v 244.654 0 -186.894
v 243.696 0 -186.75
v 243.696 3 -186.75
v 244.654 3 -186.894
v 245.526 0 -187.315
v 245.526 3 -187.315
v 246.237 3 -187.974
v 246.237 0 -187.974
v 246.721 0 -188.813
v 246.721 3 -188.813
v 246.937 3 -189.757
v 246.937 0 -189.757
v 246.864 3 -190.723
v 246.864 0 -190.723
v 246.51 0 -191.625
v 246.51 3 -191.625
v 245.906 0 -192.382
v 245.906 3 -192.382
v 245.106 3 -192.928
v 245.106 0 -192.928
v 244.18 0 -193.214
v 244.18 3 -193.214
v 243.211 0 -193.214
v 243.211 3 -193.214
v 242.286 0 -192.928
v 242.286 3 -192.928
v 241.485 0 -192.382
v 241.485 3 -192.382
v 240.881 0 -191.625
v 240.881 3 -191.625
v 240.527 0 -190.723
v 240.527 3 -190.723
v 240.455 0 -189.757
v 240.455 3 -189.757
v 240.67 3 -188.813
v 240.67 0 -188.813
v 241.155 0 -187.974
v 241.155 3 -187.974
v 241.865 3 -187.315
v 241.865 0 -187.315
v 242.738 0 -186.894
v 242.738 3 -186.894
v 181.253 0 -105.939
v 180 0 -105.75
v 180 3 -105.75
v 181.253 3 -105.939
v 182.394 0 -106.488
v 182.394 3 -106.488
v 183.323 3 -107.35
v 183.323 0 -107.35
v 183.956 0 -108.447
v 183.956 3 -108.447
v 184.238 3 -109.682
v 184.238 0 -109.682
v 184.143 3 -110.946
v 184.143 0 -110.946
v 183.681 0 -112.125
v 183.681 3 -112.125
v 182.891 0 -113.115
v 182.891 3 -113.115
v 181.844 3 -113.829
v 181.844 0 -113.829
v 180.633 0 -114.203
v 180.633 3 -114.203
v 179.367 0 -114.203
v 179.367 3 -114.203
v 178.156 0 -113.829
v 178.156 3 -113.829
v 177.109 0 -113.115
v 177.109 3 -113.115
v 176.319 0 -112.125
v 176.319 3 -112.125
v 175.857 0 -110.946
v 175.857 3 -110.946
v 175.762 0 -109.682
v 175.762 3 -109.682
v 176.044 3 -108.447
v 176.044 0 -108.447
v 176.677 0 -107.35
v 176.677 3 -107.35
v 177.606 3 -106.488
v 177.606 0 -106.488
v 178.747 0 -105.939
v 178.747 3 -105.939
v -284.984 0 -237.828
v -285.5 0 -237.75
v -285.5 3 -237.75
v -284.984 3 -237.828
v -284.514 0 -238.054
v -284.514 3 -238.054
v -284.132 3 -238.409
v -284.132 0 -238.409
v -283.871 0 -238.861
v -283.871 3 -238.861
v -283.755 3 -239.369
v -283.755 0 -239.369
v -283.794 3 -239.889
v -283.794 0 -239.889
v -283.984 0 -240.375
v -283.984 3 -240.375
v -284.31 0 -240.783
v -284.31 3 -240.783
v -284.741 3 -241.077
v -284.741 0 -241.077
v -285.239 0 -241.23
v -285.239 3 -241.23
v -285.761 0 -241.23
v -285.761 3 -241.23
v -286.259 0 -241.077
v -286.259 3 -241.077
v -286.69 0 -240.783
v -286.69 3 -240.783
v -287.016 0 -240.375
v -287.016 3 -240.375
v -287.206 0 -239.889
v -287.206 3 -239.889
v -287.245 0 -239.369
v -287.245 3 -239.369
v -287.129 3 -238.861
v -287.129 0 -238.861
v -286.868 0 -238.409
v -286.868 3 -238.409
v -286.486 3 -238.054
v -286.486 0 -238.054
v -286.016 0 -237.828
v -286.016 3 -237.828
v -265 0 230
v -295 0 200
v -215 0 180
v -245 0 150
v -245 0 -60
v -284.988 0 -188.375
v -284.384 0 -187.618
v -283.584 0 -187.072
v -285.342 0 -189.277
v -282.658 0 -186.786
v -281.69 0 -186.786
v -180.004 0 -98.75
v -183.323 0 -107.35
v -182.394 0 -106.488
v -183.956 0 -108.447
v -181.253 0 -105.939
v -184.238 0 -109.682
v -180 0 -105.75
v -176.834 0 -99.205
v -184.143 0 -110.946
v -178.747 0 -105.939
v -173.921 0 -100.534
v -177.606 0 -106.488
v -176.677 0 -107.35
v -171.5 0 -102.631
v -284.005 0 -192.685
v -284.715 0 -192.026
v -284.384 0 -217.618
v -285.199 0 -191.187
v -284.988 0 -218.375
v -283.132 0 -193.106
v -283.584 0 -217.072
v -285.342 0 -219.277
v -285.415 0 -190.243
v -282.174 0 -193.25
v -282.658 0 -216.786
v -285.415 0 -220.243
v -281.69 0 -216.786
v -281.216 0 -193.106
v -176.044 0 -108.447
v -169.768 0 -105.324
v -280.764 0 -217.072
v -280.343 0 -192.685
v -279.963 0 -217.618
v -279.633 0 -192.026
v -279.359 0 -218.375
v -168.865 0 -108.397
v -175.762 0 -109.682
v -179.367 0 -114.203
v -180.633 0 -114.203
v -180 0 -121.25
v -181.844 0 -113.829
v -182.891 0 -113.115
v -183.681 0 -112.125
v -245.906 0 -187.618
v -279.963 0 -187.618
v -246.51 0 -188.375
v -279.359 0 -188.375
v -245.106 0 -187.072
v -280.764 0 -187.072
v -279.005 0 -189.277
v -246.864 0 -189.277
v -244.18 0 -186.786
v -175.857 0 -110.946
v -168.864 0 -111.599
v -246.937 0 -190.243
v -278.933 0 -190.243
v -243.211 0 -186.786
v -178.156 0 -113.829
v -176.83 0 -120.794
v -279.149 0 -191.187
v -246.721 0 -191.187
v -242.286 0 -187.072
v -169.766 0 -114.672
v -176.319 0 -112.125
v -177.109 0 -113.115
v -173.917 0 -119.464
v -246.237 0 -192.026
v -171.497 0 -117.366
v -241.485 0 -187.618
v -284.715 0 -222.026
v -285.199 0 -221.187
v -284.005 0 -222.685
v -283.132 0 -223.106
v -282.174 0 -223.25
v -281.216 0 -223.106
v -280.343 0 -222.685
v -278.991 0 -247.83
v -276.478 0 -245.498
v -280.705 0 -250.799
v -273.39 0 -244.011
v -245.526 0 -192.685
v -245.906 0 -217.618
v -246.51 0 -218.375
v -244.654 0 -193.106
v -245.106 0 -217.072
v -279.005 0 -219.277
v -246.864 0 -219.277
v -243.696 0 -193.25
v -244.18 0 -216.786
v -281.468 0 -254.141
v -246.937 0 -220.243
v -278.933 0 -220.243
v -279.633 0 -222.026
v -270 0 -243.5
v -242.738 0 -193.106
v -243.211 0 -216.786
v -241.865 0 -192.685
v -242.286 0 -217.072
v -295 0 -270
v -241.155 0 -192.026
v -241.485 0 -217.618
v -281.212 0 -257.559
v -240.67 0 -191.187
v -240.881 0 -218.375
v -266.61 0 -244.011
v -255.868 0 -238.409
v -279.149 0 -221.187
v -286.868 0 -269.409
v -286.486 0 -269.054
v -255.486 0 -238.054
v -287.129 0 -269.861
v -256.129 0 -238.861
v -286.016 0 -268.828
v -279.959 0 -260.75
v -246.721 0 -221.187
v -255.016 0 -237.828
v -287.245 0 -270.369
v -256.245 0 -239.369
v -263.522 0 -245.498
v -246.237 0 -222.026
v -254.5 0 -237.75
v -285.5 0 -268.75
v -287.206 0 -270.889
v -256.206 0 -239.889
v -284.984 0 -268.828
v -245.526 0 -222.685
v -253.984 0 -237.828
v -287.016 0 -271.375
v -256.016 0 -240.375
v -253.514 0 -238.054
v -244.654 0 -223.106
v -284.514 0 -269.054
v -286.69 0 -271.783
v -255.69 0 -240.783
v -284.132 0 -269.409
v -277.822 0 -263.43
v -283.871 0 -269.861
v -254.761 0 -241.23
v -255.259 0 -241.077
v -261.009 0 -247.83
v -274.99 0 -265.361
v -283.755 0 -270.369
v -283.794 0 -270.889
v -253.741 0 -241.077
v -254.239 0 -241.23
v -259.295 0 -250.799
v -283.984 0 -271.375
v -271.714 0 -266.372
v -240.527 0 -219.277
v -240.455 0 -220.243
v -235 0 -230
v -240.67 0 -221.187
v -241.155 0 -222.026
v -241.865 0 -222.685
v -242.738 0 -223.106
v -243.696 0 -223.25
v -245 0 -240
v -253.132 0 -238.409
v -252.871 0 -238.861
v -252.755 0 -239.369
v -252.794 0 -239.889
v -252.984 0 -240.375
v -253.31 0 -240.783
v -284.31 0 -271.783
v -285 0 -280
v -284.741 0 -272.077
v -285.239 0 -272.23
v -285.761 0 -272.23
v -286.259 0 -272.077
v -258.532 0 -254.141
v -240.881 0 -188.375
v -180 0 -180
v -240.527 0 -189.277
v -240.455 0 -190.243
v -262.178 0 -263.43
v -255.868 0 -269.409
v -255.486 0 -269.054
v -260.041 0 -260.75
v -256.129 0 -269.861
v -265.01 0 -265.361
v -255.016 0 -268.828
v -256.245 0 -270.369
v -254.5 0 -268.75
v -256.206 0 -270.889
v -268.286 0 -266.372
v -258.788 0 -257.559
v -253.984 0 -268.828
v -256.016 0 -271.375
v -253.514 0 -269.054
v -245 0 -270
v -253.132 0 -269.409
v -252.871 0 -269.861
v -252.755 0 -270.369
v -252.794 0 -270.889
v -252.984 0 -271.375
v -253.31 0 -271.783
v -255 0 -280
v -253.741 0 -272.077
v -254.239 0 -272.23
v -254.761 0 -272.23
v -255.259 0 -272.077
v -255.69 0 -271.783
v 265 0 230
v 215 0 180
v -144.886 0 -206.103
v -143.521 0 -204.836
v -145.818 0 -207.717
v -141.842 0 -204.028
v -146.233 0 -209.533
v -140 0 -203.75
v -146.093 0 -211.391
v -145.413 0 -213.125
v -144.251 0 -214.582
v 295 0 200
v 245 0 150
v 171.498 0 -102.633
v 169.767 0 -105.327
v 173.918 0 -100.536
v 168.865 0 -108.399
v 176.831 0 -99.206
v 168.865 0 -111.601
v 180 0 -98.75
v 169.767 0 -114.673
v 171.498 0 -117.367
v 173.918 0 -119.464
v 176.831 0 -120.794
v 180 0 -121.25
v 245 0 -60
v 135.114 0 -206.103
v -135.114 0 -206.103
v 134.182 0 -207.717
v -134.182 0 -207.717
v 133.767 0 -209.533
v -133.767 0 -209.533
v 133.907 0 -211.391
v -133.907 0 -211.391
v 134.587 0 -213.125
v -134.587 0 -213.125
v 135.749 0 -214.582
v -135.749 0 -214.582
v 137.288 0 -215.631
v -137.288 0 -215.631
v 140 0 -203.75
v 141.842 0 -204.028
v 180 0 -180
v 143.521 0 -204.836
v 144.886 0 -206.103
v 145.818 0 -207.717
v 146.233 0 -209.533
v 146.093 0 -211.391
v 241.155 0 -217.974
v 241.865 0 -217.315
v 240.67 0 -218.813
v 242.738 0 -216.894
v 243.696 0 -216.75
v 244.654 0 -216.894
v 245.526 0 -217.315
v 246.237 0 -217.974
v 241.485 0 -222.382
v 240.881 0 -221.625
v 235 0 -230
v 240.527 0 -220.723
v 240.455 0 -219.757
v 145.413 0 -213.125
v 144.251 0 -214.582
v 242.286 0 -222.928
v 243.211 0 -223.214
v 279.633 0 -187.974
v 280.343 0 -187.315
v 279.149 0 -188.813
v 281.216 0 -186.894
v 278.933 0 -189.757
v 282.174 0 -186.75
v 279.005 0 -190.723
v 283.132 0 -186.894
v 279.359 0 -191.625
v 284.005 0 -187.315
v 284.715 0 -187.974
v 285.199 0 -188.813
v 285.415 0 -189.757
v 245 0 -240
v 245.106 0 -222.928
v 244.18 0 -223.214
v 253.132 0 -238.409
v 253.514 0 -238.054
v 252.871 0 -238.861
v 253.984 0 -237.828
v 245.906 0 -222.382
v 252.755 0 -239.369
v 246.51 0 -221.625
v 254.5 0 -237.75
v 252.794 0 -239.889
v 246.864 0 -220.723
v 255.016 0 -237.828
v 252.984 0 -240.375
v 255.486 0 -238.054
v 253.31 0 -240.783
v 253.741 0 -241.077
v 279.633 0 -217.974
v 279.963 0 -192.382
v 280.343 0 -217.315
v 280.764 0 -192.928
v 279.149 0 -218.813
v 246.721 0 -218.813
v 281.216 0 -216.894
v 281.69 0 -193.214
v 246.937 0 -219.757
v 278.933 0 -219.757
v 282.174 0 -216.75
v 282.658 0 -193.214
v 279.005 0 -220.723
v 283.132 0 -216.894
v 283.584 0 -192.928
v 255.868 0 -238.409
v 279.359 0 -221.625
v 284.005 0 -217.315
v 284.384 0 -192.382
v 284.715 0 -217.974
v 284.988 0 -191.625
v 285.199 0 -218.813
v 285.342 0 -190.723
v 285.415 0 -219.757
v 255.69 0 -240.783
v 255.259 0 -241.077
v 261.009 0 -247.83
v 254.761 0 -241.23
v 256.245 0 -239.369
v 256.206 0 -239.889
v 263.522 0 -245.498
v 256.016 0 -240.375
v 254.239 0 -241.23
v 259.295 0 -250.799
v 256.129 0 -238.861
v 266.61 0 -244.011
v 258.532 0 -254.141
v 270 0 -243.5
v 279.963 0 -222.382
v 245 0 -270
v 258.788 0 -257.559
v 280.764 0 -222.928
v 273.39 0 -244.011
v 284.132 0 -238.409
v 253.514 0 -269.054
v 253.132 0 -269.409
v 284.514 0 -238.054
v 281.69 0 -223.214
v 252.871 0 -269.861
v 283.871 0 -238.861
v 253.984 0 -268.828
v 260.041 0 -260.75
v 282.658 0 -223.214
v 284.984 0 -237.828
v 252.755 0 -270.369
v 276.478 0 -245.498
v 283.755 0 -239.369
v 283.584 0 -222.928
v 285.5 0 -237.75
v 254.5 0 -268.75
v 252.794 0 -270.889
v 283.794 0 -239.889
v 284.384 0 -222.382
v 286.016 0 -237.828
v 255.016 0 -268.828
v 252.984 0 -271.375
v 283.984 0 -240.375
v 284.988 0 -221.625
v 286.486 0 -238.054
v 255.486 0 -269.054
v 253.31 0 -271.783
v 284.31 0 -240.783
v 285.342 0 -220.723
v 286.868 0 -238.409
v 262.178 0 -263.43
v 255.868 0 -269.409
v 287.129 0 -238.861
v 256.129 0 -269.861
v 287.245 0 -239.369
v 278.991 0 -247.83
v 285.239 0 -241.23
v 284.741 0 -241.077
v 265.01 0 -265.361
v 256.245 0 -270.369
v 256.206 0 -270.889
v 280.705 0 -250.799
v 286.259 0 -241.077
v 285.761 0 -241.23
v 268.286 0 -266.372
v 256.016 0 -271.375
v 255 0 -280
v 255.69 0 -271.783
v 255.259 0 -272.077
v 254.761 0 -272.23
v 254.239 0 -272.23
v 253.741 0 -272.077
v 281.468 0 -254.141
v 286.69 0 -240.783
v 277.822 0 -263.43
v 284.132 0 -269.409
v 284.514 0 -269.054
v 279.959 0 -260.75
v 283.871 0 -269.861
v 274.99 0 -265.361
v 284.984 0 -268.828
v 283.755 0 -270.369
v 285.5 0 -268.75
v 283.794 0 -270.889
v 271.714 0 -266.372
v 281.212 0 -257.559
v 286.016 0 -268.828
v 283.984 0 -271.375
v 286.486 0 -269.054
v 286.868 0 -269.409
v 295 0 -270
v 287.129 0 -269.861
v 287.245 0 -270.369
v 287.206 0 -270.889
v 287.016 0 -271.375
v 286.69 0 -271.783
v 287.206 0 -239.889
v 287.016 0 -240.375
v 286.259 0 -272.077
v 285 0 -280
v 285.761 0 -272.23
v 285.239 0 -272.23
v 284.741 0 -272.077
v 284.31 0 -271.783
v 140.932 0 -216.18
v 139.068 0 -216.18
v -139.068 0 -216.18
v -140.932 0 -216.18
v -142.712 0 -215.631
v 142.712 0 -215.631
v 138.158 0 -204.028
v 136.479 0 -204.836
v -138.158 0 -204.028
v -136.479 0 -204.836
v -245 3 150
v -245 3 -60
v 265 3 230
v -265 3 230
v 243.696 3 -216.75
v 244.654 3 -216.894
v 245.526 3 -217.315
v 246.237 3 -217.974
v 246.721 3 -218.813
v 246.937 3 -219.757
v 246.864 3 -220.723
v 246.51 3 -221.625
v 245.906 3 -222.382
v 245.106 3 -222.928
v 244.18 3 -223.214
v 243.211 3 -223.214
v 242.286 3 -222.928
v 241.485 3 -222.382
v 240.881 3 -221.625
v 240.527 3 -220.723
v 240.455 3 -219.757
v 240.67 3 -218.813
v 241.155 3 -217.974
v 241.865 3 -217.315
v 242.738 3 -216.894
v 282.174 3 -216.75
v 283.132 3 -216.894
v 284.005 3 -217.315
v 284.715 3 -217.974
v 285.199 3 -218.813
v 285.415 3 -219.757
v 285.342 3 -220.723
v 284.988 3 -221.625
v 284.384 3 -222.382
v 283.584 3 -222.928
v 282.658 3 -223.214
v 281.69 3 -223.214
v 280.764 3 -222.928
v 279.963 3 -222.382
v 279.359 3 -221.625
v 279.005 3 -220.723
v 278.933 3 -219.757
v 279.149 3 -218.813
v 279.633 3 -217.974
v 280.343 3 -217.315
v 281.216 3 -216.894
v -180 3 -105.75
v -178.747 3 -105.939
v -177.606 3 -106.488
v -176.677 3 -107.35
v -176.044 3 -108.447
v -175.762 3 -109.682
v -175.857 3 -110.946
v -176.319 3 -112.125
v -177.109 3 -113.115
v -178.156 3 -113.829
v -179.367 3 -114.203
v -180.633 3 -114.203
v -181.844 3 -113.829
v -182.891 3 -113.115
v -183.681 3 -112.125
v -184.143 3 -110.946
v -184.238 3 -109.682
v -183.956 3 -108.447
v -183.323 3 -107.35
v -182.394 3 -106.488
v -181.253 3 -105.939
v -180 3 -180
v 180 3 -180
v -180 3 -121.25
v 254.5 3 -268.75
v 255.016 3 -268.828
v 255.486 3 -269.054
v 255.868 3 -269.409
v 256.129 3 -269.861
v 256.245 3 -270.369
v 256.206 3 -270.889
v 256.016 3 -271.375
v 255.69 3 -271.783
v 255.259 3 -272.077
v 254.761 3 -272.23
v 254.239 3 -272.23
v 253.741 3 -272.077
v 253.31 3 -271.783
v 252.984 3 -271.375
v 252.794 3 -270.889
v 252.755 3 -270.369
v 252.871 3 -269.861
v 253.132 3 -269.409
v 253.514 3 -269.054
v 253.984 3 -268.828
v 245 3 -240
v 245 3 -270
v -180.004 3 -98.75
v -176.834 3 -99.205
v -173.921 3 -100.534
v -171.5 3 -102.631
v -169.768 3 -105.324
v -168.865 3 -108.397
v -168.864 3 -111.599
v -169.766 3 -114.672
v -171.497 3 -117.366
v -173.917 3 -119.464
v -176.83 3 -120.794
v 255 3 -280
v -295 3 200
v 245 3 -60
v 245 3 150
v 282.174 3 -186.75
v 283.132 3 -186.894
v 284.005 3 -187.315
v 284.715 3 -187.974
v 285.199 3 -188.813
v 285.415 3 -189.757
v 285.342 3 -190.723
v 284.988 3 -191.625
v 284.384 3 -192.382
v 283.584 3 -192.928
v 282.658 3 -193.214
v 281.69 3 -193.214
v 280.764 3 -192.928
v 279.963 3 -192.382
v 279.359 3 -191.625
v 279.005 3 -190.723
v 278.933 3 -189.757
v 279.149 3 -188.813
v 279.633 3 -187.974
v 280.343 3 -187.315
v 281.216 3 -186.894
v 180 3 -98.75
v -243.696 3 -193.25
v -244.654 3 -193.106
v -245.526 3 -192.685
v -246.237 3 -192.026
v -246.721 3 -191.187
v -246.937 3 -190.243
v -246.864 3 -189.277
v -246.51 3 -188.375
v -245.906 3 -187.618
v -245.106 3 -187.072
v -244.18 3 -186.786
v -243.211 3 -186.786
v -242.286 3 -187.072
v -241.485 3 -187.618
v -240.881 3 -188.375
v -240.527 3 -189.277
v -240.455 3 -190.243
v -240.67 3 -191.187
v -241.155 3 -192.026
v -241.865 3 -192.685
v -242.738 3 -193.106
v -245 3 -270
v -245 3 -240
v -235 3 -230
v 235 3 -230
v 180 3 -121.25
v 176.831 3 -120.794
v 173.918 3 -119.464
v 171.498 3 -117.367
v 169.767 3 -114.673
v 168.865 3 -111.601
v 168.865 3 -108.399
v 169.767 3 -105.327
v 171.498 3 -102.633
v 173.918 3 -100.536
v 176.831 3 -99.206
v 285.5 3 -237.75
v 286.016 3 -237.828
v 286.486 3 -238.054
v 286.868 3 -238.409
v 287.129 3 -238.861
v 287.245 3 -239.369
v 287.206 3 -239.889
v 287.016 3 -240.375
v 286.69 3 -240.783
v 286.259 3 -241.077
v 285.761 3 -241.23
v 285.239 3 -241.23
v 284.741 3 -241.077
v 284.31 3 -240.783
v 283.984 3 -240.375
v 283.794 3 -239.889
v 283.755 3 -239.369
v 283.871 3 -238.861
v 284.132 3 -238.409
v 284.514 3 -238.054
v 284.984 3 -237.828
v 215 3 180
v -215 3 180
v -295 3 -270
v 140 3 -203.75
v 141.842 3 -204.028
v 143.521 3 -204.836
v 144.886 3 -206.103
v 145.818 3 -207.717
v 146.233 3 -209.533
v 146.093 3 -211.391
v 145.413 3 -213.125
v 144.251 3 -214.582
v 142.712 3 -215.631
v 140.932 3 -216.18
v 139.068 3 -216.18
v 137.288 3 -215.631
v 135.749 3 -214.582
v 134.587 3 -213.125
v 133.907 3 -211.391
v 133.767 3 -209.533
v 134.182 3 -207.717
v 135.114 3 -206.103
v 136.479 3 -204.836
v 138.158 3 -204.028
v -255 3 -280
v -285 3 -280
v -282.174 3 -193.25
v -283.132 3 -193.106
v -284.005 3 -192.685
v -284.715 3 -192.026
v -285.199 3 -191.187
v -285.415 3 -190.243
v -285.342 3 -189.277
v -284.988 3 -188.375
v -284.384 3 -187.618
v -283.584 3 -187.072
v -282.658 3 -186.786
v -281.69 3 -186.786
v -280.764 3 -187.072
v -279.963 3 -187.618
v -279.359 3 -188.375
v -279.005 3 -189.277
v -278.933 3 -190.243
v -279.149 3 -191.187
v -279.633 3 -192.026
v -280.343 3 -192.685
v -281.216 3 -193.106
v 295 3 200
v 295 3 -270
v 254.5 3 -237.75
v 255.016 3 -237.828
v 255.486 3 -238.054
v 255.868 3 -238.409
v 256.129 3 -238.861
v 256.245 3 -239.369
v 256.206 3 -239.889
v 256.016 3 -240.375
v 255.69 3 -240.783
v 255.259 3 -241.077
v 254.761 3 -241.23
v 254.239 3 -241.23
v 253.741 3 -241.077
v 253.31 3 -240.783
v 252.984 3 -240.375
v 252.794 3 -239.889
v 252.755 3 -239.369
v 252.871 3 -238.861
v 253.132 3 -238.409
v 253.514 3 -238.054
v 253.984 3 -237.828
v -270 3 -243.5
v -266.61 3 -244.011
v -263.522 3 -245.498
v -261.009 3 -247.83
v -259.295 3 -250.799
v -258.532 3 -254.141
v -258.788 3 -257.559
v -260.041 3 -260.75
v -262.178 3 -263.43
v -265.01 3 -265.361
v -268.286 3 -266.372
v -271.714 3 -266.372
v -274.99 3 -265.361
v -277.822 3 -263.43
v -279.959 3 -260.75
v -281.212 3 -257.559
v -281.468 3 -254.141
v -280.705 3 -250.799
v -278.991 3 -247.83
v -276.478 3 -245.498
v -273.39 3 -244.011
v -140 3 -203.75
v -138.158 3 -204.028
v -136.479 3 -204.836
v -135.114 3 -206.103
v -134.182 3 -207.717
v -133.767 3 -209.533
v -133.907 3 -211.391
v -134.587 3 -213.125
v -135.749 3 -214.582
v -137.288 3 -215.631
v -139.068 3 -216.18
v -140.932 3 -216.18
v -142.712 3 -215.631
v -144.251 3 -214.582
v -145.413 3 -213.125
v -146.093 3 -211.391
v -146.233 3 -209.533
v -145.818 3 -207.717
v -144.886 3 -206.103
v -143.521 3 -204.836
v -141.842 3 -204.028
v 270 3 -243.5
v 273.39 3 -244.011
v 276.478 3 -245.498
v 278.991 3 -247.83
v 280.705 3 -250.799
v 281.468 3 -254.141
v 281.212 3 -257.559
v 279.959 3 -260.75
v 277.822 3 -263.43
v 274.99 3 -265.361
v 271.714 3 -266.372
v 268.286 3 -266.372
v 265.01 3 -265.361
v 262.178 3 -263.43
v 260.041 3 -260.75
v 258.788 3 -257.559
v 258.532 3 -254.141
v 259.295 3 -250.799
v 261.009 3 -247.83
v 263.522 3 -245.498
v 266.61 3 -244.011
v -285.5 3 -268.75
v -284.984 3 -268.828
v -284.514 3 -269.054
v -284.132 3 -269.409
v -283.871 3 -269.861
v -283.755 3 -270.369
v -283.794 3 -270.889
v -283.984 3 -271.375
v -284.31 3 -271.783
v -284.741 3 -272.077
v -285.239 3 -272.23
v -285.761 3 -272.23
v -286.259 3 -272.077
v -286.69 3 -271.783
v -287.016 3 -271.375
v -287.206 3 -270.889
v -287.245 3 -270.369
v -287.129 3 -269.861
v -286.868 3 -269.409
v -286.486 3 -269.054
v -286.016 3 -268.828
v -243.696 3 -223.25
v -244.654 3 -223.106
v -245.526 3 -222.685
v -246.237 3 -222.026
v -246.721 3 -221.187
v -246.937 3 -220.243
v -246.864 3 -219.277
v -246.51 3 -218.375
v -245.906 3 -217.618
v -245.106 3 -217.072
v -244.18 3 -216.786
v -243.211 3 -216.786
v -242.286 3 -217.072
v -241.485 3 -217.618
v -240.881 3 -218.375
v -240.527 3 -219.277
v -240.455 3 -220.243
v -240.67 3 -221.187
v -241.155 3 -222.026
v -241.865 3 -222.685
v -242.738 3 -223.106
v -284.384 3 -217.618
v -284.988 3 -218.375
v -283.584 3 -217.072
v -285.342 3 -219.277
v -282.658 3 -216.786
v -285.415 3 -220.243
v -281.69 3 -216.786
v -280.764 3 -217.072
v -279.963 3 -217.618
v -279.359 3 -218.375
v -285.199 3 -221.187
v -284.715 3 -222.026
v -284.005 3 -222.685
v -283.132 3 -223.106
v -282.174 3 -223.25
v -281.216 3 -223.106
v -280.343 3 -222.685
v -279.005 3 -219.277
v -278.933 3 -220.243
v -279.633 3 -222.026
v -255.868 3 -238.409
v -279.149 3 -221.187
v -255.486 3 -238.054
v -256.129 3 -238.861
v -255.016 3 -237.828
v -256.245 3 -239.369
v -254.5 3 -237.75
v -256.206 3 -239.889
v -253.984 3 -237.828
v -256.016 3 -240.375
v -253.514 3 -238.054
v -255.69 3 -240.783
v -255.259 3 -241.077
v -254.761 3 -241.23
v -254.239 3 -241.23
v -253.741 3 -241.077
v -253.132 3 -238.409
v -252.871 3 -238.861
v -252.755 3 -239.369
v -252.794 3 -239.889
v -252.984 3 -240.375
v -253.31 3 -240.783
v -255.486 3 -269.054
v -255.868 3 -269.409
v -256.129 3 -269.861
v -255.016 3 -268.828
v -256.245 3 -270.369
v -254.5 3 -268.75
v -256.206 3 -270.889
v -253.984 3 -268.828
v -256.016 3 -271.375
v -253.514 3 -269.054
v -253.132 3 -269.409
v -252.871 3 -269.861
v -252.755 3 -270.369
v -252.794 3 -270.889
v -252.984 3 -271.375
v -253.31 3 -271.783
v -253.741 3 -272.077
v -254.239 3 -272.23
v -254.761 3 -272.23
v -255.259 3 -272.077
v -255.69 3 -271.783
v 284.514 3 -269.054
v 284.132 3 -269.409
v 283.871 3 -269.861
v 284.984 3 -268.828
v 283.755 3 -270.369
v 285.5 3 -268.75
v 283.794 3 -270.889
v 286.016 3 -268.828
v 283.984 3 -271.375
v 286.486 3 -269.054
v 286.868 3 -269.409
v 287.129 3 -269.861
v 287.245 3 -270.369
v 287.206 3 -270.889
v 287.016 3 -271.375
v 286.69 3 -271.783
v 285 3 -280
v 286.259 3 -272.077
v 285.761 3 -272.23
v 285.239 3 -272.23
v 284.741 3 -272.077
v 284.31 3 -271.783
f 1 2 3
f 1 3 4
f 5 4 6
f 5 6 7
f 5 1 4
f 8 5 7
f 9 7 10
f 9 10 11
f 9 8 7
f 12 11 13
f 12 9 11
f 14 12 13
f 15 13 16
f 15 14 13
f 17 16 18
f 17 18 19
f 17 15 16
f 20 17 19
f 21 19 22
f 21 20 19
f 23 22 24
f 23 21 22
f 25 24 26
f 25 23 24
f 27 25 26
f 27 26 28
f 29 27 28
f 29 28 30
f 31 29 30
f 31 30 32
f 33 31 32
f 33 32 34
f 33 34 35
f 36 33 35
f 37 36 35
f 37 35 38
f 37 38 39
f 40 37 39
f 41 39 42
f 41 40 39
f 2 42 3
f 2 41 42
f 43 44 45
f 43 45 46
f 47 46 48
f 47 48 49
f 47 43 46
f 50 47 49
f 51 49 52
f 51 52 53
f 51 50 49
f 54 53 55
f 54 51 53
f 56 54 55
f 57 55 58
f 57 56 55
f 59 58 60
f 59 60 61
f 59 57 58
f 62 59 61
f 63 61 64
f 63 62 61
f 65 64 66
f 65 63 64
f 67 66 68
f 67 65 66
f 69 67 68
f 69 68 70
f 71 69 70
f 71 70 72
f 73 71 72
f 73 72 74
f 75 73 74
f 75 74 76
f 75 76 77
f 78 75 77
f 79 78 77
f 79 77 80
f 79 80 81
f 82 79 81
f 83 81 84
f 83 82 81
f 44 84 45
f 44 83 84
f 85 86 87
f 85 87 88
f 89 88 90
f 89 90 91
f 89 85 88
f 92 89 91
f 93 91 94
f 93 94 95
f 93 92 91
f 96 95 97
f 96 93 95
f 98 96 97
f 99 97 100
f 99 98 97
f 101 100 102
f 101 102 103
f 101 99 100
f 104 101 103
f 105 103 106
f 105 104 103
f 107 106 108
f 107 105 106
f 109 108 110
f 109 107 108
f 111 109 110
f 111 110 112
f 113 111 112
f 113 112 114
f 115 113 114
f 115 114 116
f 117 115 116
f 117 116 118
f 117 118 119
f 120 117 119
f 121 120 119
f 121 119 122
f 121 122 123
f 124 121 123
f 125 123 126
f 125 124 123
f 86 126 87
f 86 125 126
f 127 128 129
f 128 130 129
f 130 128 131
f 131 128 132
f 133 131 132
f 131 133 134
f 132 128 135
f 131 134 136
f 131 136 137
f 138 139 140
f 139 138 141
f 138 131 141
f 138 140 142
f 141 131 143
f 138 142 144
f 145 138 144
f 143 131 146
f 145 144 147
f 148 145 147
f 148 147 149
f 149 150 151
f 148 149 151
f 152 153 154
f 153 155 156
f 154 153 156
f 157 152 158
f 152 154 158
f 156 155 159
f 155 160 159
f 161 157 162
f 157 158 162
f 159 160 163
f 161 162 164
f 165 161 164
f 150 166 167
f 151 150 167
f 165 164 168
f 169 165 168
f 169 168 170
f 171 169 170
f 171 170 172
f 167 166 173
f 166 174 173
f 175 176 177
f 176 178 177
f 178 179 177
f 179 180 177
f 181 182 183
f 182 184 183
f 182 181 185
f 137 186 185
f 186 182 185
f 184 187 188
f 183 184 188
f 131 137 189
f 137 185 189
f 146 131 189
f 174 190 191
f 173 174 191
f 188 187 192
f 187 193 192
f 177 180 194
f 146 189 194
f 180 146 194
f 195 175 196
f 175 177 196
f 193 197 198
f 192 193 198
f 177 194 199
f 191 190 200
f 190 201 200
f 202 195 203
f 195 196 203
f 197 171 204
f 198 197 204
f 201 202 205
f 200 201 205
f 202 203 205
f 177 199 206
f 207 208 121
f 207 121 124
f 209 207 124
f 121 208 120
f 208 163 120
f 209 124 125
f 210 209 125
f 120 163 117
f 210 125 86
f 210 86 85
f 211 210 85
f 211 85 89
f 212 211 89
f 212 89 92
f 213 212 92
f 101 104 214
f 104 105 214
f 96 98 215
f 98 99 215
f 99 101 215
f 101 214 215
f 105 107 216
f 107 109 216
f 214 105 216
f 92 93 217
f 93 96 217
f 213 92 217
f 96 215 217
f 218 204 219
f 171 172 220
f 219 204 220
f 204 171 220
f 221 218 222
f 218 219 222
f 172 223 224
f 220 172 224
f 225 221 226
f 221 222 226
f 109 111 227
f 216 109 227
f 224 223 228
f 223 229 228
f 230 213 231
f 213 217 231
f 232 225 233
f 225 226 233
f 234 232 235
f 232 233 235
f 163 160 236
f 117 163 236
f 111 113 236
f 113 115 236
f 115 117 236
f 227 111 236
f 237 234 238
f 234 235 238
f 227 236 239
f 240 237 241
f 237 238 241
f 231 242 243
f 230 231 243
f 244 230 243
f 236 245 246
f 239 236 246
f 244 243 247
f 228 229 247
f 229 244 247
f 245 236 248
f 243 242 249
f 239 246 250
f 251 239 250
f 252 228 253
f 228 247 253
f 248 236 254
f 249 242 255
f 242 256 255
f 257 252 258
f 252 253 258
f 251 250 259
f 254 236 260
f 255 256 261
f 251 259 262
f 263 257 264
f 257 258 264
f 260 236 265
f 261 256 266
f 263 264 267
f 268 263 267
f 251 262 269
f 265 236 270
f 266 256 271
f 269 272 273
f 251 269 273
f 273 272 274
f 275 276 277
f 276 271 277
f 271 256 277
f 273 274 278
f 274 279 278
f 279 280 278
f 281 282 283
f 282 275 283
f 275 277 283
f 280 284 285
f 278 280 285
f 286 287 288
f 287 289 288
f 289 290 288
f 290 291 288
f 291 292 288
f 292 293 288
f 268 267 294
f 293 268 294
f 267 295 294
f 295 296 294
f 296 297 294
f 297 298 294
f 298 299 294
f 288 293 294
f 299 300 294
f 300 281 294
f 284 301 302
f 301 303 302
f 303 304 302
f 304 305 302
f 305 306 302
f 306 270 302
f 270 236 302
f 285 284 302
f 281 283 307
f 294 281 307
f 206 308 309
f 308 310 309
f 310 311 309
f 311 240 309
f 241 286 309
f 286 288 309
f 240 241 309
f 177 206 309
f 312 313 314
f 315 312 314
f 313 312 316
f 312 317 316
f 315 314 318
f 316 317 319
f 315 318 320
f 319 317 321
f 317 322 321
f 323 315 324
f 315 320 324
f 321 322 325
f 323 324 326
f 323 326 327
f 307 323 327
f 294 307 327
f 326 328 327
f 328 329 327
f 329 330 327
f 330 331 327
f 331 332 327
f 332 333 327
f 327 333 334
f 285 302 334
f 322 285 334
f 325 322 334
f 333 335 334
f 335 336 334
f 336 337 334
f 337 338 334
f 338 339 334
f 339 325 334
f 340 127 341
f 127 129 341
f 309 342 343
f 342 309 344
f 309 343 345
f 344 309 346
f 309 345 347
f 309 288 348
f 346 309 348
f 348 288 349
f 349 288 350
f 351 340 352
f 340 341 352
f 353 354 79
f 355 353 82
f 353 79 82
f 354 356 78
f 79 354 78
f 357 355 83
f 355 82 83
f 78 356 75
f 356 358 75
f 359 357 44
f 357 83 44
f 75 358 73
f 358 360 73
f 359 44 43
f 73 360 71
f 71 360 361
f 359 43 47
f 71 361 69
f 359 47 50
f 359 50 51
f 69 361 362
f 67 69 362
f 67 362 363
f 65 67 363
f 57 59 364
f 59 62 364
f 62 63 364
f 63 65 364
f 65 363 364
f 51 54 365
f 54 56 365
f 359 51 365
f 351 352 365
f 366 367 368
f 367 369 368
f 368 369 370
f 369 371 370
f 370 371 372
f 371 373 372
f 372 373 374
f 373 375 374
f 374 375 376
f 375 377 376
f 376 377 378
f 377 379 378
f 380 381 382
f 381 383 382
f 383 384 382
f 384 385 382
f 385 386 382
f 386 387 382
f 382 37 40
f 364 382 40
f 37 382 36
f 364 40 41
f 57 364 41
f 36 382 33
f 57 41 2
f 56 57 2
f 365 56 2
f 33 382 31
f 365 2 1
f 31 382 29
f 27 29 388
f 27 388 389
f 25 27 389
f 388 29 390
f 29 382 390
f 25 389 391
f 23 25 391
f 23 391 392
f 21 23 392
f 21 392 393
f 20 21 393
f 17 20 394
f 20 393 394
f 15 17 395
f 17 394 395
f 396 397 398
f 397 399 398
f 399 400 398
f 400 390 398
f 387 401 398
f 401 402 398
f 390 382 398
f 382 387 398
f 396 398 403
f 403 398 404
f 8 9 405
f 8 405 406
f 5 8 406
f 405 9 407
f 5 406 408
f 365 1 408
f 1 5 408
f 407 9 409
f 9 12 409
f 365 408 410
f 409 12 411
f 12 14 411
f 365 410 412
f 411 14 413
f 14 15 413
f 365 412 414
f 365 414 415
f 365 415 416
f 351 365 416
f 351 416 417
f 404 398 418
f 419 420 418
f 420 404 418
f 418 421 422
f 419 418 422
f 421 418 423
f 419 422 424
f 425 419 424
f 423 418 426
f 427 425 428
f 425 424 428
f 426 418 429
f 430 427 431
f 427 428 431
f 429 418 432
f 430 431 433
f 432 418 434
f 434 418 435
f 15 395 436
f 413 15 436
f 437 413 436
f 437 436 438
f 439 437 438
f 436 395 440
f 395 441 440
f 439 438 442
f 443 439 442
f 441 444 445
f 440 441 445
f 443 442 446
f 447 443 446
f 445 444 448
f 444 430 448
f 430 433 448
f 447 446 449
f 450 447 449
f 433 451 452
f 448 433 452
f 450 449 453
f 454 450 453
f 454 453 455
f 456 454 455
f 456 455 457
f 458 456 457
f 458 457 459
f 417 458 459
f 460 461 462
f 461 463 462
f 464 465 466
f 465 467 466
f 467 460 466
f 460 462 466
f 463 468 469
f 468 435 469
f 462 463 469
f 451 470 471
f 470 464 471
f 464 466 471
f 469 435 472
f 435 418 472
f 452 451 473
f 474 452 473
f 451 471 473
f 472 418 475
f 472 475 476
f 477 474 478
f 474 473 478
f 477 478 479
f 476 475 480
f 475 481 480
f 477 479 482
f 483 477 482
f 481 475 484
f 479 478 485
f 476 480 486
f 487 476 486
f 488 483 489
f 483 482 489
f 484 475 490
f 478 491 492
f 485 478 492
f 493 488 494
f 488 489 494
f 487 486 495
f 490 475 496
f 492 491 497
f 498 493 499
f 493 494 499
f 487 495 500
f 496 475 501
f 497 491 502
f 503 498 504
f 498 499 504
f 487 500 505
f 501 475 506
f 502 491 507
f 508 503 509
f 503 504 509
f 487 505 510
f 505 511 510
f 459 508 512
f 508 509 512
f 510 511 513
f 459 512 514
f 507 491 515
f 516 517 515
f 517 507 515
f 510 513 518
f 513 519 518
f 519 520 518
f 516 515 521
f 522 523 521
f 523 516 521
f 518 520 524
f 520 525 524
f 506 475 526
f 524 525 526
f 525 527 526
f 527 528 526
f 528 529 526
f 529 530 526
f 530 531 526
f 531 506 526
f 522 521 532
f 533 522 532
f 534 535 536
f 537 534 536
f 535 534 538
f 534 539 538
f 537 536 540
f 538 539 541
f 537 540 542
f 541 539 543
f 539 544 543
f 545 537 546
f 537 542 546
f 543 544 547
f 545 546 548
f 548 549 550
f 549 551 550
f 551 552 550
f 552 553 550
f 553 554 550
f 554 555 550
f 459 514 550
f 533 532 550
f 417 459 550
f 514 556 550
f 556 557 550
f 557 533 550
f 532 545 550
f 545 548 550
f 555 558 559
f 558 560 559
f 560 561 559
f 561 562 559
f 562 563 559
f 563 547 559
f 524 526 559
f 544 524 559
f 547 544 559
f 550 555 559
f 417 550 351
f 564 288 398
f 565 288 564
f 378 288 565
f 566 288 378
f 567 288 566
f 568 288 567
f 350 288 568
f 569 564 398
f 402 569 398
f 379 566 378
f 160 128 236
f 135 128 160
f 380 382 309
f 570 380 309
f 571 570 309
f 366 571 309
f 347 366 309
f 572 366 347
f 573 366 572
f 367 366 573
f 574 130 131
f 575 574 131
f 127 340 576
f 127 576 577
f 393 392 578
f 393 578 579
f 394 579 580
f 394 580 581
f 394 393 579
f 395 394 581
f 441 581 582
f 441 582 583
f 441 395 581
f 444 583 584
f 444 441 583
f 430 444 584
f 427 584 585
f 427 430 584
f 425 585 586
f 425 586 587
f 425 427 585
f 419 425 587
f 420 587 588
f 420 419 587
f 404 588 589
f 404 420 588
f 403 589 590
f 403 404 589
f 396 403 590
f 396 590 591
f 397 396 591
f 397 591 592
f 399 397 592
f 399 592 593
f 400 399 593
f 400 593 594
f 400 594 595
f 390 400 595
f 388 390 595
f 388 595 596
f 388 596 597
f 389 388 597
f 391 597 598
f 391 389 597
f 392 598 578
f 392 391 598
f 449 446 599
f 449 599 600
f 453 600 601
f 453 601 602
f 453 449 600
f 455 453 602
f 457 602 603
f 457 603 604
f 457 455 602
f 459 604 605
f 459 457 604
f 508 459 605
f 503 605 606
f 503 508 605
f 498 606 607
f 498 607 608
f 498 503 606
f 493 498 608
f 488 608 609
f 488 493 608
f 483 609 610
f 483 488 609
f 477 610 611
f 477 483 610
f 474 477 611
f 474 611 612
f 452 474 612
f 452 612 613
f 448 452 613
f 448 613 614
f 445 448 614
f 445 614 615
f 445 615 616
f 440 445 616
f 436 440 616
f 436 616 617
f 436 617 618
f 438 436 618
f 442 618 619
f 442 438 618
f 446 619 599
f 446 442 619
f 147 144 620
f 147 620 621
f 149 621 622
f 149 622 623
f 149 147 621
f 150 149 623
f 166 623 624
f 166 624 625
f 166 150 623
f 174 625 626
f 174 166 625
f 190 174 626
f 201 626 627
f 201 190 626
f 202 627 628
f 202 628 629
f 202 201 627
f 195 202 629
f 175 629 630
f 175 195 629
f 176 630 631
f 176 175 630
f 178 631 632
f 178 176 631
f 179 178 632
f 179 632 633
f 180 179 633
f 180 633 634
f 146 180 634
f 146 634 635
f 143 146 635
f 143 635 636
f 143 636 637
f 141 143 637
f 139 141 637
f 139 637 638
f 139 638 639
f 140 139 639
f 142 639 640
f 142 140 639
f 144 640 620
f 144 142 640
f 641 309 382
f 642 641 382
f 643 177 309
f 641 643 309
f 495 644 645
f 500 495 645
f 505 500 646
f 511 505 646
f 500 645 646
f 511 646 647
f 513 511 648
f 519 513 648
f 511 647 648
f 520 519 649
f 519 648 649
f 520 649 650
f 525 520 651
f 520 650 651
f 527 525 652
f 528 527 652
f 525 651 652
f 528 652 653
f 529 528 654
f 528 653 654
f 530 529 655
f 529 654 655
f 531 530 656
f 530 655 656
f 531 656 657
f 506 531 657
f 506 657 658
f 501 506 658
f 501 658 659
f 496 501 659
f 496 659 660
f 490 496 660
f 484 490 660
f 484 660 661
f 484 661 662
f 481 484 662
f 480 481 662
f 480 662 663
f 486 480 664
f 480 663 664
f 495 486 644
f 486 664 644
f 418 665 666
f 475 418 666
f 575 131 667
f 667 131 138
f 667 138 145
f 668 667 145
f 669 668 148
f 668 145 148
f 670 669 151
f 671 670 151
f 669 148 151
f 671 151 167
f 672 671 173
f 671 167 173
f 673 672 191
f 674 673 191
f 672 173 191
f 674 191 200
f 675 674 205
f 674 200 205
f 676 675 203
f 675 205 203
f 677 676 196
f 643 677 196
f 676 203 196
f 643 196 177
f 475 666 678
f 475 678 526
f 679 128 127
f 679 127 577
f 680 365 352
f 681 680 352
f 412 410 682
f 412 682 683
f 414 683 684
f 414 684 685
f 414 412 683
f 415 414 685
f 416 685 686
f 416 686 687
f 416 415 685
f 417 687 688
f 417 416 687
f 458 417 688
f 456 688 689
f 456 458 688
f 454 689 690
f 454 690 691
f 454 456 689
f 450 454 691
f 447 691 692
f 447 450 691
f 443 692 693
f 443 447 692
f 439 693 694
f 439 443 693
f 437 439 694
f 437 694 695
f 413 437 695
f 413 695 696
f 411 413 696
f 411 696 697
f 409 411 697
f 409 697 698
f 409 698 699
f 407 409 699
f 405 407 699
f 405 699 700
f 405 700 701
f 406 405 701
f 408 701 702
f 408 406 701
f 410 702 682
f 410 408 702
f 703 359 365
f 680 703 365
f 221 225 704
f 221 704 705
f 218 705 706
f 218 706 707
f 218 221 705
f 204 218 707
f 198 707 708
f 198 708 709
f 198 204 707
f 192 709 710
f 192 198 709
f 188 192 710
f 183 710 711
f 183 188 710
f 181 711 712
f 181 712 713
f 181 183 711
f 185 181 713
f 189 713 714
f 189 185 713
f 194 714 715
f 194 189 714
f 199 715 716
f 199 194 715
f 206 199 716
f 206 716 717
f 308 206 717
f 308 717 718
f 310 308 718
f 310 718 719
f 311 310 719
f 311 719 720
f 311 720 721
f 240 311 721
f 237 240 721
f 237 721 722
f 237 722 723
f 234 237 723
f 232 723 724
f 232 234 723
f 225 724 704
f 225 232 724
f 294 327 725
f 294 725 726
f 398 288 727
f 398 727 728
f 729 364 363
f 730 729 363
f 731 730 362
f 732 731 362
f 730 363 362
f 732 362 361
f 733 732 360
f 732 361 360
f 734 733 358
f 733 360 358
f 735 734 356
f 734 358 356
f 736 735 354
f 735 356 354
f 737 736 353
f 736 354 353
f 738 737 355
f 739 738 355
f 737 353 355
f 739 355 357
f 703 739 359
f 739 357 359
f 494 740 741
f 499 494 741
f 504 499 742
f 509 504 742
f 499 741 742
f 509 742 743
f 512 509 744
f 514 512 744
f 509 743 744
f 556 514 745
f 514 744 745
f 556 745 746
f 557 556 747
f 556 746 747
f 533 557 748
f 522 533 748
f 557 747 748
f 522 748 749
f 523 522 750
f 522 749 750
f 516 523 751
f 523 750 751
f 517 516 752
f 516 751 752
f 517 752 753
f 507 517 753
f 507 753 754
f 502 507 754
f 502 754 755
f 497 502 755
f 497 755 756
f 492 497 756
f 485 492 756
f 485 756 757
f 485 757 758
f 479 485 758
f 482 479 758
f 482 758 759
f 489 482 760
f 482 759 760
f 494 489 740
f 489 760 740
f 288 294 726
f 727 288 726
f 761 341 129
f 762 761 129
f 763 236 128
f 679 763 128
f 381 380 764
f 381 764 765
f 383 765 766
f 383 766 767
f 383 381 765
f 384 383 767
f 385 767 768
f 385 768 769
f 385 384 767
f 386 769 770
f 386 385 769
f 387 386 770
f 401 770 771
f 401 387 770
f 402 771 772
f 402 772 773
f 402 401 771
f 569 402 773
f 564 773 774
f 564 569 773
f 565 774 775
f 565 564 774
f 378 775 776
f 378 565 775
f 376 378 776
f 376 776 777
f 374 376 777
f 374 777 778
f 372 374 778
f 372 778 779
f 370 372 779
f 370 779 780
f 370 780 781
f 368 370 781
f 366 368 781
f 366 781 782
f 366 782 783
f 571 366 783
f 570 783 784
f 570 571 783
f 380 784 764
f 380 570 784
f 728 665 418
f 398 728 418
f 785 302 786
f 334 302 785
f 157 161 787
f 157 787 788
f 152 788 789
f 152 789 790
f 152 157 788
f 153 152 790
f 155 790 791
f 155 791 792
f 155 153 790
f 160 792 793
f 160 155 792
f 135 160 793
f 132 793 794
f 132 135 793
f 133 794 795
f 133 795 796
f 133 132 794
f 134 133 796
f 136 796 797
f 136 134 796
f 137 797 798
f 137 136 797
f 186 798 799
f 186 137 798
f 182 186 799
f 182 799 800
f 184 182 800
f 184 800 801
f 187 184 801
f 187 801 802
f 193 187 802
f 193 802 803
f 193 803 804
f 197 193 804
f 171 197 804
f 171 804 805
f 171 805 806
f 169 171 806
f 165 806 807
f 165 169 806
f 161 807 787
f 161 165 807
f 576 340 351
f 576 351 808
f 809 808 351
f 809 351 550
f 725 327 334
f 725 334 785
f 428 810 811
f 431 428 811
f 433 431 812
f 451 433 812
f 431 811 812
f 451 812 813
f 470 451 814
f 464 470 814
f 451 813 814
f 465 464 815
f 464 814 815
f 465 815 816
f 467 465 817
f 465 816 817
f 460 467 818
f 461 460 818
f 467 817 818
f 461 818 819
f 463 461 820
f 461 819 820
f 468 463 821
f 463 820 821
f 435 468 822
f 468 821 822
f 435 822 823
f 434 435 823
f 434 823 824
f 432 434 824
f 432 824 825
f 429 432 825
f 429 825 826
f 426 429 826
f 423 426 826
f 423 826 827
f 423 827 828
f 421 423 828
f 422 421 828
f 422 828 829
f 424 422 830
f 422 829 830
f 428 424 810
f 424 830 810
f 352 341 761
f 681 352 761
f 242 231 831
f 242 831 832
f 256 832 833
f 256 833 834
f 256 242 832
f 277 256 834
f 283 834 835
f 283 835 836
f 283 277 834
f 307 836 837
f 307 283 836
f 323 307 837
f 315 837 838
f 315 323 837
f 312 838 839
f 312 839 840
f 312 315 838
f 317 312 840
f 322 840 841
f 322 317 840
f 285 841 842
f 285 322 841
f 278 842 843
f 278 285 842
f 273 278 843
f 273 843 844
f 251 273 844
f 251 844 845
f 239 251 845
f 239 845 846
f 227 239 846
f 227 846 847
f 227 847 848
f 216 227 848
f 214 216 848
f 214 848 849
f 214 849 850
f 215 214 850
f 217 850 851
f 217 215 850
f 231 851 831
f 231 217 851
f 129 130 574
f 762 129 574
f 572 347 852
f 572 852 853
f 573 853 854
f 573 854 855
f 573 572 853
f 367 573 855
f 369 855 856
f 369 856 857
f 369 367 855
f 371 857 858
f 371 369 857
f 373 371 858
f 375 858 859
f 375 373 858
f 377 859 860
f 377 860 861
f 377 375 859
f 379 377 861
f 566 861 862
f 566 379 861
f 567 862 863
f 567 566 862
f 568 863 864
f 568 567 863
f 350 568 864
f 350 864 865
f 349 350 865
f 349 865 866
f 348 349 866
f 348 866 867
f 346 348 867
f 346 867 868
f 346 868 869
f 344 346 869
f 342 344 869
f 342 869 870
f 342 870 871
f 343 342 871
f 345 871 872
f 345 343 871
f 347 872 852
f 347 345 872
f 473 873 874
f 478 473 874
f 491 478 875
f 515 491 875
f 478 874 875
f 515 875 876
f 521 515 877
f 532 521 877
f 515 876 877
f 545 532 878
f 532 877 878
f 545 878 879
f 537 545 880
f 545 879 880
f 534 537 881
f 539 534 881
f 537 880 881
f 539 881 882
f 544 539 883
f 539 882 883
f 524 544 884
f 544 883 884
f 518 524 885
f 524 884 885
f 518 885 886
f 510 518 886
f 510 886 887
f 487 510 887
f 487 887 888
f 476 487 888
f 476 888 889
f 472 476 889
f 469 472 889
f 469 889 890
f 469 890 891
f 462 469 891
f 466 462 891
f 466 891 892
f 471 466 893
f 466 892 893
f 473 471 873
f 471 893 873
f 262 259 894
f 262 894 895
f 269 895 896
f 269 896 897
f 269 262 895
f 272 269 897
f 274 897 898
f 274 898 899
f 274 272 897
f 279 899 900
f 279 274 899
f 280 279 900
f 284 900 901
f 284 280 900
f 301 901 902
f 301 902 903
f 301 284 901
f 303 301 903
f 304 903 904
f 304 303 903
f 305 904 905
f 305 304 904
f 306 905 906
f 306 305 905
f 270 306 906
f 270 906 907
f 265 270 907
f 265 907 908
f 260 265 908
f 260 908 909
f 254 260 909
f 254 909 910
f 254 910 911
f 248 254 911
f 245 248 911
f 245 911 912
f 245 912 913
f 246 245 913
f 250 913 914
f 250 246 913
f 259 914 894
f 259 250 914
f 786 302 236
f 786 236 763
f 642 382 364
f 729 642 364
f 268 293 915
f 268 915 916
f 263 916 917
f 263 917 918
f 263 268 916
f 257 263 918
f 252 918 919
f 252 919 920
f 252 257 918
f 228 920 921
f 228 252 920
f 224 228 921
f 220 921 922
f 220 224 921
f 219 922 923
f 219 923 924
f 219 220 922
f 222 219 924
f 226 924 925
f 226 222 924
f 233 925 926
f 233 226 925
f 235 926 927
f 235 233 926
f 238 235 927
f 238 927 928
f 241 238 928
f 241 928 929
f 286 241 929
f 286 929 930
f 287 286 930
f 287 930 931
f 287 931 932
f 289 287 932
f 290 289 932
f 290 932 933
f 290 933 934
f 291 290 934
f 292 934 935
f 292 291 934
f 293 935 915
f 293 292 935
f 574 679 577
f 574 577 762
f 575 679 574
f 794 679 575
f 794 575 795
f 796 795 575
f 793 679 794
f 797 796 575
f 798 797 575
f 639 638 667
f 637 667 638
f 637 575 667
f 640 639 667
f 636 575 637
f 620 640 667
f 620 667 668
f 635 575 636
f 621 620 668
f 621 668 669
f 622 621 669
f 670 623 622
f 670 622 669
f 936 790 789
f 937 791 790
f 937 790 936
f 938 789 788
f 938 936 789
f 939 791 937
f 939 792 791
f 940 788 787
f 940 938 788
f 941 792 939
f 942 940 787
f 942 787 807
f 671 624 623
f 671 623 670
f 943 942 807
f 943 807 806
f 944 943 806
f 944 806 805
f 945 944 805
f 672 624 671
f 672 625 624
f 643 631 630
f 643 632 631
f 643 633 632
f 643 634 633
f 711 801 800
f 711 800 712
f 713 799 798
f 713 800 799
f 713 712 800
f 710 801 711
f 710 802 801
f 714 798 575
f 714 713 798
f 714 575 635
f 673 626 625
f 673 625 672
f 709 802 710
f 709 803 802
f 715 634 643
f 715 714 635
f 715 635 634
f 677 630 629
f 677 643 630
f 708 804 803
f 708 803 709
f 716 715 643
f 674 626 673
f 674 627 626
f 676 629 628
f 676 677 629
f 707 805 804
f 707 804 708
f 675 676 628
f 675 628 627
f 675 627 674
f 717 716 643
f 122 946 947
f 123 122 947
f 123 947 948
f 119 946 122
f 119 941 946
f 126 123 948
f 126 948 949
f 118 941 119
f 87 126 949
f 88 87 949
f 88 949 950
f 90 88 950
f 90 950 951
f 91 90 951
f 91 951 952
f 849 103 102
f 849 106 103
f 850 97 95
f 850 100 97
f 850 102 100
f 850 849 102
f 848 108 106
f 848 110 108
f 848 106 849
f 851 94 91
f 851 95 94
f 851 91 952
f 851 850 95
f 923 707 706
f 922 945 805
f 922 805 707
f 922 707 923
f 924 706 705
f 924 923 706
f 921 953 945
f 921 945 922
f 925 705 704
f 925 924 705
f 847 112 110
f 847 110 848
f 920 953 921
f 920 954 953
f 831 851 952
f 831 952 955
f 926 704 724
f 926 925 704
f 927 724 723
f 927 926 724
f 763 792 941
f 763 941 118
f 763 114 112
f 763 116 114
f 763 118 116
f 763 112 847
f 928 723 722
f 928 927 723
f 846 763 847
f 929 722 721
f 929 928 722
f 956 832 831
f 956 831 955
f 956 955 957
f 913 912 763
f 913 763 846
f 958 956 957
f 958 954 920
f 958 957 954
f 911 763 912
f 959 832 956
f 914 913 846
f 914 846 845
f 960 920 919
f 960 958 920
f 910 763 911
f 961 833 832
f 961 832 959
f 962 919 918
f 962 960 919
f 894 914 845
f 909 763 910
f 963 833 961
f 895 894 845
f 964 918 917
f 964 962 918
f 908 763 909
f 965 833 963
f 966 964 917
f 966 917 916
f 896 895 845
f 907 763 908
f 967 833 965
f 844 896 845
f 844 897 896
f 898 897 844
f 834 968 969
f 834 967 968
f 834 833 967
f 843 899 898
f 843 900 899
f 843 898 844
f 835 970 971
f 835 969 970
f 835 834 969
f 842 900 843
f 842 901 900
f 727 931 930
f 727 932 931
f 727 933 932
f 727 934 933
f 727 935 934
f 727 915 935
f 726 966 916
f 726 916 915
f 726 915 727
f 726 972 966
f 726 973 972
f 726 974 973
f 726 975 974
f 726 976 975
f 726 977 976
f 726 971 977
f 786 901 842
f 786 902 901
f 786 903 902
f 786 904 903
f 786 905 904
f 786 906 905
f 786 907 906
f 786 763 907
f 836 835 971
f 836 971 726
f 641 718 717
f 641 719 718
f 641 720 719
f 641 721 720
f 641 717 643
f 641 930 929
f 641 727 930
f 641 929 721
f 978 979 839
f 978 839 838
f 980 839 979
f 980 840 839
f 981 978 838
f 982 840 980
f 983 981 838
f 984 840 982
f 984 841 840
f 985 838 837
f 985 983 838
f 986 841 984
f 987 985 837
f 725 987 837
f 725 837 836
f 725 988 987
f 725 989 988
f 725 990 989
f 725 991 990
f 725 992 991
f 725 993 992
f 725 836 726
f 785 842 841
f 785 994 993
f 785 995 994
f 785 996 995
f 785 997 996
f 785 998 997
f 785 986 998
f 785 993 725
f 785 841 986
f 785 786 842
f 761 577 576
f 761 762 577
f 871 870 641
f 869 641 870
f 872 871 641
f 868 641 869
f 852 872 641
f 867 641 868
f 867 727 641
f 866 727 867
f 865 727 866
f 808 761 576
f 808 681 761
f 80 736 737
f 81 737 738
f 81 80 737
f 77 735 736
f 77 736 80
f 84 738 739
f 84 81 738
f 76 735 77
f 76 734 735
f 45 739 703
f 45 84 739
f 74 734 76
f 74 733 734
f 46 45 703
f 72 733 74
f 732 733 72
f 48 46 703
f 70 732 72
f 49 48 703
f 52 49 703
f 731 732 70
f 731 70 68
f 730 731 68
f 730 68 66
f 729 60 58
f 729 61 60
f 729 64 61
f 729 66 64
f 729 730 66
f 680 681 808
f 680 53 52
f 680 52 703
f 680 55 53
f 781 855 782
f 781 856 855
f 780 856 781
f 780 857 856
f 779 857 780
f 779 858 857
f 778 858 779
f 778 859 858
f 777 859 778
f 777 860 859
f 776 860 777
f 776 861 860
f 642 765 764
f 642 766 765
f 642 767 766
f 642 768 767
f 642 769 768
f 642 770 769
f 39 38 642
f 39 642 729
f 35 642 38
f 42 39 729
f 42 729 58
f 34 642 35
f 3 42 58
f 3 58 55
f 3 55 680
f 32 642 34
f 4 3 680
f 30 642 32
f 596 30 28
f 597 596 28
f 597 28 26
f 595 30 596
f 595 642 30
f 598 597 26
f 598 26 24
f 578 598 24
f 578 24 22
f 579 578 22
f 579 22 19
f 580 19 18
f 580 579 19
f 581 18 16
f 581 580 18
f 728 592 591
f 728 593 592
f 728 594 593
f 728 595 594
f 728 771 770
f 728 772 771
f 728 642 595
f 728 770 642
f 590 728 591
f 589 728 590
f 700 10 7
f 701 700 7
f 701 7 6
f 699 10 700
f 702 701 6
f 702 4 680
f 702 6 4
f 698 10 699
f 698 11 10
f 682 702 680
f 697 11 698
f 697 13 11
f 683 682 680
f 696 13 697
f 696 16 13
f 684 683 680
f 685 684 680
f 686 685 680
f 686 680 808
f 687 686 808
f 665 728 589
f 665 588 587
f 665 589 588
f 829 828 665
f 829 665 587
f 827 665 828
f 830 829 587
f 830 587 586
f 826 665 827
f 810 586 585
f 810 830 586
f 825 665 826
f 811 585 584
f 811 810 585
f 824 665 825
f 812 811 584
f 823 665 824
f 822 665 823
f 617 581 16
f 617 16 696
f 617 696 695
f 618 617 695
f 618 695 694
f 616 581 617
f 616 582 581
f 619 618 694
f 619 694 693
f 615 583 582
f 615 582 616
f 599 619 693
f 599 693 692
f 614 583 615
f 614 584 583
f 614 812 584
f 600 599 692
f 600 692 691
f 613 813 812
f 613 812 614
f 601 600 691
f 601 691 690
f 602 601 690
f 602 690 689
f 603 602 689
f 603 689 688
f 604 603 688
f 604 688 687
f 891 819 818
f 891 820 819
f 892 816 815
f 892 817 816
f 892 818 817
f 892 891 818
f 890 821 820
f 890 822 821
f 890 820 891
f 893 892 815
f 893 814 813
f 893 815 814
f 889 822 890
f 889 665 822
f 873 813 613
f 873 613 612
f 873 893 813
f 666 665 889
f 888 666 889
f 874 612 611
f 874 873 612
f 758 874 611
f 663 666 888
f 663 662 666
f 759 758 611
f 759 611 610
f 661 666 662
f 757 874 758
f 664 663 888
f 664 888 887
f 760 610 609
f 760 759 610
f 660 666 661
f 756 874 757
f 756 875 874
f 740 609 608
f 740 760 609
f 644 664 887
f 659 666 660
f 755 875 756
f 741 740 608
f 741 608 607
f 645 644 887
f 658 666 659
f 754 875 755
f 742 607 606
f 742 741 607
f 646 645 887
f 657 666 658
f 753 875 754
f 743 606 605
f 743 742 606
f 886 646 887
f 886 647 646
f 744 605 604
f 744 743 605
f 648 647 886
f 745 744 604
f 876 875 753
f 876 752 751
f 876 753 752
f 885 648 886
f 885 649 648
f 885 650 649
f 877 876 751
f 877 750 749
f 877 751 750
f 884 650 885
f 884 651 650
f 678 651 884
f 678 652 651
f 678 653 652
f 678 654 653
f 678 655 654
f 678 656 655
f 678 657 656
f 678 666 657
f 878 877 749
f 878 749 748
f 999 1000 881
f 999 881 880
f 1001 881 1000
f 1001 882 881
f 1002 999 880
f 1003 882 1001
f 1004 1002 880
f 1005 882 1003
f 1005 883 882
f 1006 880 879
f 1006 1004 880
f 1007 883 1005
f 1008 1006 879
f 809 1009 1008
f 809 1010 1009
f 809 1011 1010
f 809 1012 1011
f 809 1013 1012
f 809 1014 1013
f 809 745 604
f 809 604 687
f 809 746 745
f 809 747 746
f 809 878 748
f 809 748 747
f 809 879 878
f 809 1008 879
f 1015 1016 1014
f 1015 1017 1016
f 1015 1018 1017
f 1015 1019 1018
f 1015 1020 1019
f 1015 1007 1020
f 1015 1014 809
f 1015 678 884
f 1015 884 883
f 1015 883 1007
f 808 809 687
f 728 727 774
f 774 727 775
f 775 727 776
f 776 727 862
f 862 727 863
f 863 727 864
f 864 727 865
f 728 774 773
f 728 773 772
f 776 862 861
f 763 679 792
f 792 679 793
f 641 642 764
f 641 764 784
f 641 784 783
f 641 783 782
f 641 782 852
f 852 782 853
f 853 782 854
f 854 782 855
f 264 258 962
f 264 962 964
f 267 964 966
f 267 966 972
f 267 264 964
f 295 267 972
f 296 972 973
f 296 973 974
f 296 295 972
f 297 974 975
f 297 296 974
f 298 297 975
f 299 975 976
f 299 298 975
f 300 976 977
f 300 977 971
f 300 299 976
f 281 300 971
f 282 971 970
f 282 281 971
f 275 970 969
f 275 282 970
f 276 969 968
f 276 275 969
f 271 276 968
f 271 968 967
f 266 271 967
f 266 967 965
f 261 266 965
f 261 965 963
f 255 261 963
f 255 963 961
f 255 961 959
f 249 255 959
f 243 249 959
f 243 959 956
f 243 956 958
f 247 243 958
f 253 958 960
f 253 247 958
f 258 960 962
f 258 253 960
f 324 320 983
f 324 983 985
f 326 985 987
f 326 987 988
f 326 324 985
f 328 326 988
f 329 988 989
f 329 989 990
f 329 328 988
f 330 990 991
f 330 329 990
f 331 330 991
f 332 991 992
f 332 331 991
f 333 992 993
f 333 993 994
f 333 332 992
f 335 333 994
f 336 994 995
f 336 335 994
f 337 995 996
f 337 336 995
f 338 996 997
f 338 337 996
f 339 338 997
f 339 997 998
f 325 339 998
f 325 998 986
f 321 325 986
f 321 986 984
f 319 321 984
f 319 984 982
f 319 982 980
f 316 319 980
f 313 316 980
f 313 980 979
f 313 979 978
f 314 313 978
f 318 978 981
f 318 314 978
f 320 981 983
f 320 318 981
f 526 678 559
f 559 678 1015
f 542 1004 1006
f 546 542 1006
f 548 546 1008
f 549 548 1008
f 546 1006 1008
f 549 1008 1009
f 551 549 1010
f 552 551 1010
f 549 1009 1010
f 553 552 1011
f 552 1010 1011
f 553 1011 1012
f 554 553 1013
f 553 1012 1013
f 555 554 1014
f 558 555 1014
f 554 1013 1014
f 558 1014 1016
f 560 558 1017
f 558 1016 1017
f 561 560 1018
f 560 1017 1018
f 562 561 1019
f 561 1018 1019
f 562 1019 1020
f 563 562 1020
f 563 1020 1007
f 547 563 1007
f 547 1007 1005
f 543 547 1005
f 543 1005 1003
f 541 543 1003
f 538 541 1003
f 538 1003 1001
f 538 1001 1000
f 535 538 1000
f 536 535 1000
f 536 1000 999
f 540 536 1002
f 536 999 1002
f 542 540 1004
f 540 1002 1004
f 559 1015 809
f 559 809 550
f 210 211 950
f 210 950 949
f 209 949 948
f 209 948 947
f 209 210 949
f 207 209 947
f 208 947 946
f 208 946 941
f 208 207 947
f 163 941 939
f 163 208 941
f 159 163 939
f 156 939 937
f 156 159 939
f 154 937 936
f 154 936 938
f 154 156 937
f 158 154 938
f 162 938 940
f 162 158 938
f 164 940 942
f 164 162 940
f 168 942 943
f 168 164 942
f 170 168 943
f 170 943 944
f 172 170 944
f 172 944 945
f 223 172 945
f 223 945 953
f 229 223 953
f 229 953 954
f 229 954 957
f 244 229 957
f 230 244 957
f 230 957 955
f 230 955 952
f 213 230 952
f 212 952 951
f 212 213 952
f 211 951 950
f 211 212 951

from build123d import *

# Parameters (mm, degrees)
SKETCH1_R           = 6.25
SKETCH1_R_2         = 4.25
SKETCH1_R_3         = 3.25
SKETCH1_R_4         = 11.5
SKETCH1_R_5         = 1.75
BOSS_EXTRUDE1_DEPTH = 3
SKETCH2_W           = 50
SKETCH2_H           = 50
SKETCH2_R           = 11.5
SKETCH2_R_2         = 1.75
BOSS_EXTRUDE2_DEPTH = 3
CHAMFER1_SIZE       = 10
CHAMFER2_SIZE       = 30


with BuildPart() as part:
    # Sketch1 → Boss-Extrude1 (new body)
    with BuildSketch(Plane(origin=(0, 0, 0), x_dir=(1, 0, 0), z_dir=(0, 1, 0))):
        Polygon((-245, 230), (295, 230), (295, -230), (-295, -230), (-295, 230), (-295, 280), (-245, 280), align=None)
        with Locations(Location((-140, 210, 0), (0, 0, 270))):
            Circle(SKETCH1_R, mode=Mode.SUBTRACT)
        with Locations(Location((140, 210, 0), (0, 0, 270))):
            Circle(SKETCH1_R, mode=Mode.SUBTRACT)
        with Locations(Location((-180, 110, 0), (0, 0, 270))):
            Circle(SKETCH1_R_2, mode=Mode.SUBTRACT)
        with Locations(Location((180, 110, 0), (0, 0, 270))):
            Circle(SKETCH1_R_2, mode=Mode.SUBTRACT)
        with Locations(Location((243.695652174, 220, 0), (0, 0, 270))):
            Circle(SKETCH1_R_3, mode=Mode.SUBTRACT)
        with Locations(Location((282.173913043, 220, 0), (0, 0, 270))):
            Circle(SKETCH1_R_3, mode=Mode.SUBTRACT)
        with Locations(Location((282.173913043, 190, 0), (0, 0, 270))):
            Circle(SKETCH1_R_3, mode=Mode.SUBTRACT)
        with Locations(Location((243.695652174, 190, 0), (0, 0, 270))):
            Circle(SKETCH1_R_3, mode=Mode.SUBTRACT)
        with Locations(Location((-282.173913043, 220, 0), (0, 0, 90))):
            Circle(SKETCH1_R_3, mode=Mode.SUBTRACT)
        with Locations(Location((-243.695652174, 220, 0), (0, 0, 90))):
            Circle(SKETCH1_R_3, mode=Mode.SUBTRACT)
        with Locations(Location((-243.695652174, 190, 0), (0, 0, 90))):
            Circle(SKETCH1_R_3, mode=Mode.SUBTRACT)
        with Locations(Location((-282.173913043, 190, 0), (0, 0, 90))):
            Circle(SKETCH1_R_3, mode=Mode.SUBTRACT)
        with Locations(Location((-270, 255, 0), (0, 0, 270))):
            Circle(SKETCH1_R_4, mode=Mode.SUBTRACT)
        with Locations(Location((-285.5, 239.5, 0), (0, 0, 270))):
            Circle(SKETCH1_R_5, mode=Mode.SUBTRACT)
        with Locations(Location((-285.5, 270.5, 0), (0, 0, 270))):
            Circle(SKETCH1_R_5, mode=Mode.SUBTRACT)
        with Locations(Location((-254.5, 270.5, 0), (0, 0, 270))):
            Circle(SKETCH1_R_5, mode=Mode.SUBTRACT)
        with Locations(Location((-254.5, 239.5, 0), (0, 0, 270))):
            Circle(SKETCH1_R_5, mode=Mode.SUBTRACT)
        with BuildLine():
            Line((-180, 180), (180, 180))
            Line((180, 180), (180, 121.25))
            ThreePointArc((180, 121.25), (168.75, 110), (180, 98.75))
            Line((180, 98.75), (245, 60))
            Line((245, 60), (245, -180))
            Line((245, -180), (-245, -180))
            Line((-245, -180), (-245, 60))
            Line((-245, 60), (-180.004119379, 98.750000754))
            ThreePointArc((-180.004119379, 98.750000754), (-168.750000189, 109.997940311), (-180, 121.25))
            Line((-180, 121.25), (-180, 180))
        make_face(mode=Mode.SUBTRACT)
    extrude(amount=BOSS_EXTRUDE1_DEPTH)

    # Sketch2 → Boss-Extrude2 (add)
    with BuildSketch(Plane(origin=(0, 3, 0), x_dir=(1, 0, 0), z_dir=(0, 1, 0))):
        with Locations((270, 255)):
            Rectangle(SKETCH2_W, SKETCH2_H)
        with Locations(Location((270, 255, 0), (0, 0, 270))):
            Circle(SKETCH2_R, mode=Mode.SUBTRACT)
        with Locations(Location((254.5, 270.5, 0), (0, 0, 270))):
            Circle(SKETCH2_R_2, mode=Mode.SUBTRACT)
        with Locations(Location((285.5, 270.5, 0), (0, 0, 270))):
            Circle(SKETCH2_R_2, mode=Mode.SUBTRACT)
        with Locations(Location((254.5, 239.5, 0), (0, 0, 270))):
            Circle(SKETCH2_R_2, mode=Mode.SUBTRACT)
        with Locations(Location((285.5, 239.5, 0), (0, 0, 270))):
            Circle(SKETCH2_R_2, mode=Mode.SUBTRACT)
    extrude(amount=-BOSS_EXTRUDE2_DEPTH)

    # Chamfer1
    chamfer1_edges = [part.edges().sort_by_distance(p)[0] for p in [
        (-295, 1.5, -280),
        (-245, 1.5, -280),
        (-245, 1.5, -230),
        (245, 1.5, -280),
        (245, 1.5, -230),
        (295, 1.5, -280),
    ]]
    chamfer(chamfer1_edges, length=CHAMFER1_SIZE)

    # Chamfer2
    chamfer2_edges = [part.edges().sort_by_distance(p)[0] for p in [
        (295, 1.5, 230),
        (-295, 1.5, 230),
        (245, 1.5, 180),
        (-245, 1.5, 180),
    ]]
    chamfer(chamfer2_edges, length=CHAMFER2_SIZE)


solid = part.part
